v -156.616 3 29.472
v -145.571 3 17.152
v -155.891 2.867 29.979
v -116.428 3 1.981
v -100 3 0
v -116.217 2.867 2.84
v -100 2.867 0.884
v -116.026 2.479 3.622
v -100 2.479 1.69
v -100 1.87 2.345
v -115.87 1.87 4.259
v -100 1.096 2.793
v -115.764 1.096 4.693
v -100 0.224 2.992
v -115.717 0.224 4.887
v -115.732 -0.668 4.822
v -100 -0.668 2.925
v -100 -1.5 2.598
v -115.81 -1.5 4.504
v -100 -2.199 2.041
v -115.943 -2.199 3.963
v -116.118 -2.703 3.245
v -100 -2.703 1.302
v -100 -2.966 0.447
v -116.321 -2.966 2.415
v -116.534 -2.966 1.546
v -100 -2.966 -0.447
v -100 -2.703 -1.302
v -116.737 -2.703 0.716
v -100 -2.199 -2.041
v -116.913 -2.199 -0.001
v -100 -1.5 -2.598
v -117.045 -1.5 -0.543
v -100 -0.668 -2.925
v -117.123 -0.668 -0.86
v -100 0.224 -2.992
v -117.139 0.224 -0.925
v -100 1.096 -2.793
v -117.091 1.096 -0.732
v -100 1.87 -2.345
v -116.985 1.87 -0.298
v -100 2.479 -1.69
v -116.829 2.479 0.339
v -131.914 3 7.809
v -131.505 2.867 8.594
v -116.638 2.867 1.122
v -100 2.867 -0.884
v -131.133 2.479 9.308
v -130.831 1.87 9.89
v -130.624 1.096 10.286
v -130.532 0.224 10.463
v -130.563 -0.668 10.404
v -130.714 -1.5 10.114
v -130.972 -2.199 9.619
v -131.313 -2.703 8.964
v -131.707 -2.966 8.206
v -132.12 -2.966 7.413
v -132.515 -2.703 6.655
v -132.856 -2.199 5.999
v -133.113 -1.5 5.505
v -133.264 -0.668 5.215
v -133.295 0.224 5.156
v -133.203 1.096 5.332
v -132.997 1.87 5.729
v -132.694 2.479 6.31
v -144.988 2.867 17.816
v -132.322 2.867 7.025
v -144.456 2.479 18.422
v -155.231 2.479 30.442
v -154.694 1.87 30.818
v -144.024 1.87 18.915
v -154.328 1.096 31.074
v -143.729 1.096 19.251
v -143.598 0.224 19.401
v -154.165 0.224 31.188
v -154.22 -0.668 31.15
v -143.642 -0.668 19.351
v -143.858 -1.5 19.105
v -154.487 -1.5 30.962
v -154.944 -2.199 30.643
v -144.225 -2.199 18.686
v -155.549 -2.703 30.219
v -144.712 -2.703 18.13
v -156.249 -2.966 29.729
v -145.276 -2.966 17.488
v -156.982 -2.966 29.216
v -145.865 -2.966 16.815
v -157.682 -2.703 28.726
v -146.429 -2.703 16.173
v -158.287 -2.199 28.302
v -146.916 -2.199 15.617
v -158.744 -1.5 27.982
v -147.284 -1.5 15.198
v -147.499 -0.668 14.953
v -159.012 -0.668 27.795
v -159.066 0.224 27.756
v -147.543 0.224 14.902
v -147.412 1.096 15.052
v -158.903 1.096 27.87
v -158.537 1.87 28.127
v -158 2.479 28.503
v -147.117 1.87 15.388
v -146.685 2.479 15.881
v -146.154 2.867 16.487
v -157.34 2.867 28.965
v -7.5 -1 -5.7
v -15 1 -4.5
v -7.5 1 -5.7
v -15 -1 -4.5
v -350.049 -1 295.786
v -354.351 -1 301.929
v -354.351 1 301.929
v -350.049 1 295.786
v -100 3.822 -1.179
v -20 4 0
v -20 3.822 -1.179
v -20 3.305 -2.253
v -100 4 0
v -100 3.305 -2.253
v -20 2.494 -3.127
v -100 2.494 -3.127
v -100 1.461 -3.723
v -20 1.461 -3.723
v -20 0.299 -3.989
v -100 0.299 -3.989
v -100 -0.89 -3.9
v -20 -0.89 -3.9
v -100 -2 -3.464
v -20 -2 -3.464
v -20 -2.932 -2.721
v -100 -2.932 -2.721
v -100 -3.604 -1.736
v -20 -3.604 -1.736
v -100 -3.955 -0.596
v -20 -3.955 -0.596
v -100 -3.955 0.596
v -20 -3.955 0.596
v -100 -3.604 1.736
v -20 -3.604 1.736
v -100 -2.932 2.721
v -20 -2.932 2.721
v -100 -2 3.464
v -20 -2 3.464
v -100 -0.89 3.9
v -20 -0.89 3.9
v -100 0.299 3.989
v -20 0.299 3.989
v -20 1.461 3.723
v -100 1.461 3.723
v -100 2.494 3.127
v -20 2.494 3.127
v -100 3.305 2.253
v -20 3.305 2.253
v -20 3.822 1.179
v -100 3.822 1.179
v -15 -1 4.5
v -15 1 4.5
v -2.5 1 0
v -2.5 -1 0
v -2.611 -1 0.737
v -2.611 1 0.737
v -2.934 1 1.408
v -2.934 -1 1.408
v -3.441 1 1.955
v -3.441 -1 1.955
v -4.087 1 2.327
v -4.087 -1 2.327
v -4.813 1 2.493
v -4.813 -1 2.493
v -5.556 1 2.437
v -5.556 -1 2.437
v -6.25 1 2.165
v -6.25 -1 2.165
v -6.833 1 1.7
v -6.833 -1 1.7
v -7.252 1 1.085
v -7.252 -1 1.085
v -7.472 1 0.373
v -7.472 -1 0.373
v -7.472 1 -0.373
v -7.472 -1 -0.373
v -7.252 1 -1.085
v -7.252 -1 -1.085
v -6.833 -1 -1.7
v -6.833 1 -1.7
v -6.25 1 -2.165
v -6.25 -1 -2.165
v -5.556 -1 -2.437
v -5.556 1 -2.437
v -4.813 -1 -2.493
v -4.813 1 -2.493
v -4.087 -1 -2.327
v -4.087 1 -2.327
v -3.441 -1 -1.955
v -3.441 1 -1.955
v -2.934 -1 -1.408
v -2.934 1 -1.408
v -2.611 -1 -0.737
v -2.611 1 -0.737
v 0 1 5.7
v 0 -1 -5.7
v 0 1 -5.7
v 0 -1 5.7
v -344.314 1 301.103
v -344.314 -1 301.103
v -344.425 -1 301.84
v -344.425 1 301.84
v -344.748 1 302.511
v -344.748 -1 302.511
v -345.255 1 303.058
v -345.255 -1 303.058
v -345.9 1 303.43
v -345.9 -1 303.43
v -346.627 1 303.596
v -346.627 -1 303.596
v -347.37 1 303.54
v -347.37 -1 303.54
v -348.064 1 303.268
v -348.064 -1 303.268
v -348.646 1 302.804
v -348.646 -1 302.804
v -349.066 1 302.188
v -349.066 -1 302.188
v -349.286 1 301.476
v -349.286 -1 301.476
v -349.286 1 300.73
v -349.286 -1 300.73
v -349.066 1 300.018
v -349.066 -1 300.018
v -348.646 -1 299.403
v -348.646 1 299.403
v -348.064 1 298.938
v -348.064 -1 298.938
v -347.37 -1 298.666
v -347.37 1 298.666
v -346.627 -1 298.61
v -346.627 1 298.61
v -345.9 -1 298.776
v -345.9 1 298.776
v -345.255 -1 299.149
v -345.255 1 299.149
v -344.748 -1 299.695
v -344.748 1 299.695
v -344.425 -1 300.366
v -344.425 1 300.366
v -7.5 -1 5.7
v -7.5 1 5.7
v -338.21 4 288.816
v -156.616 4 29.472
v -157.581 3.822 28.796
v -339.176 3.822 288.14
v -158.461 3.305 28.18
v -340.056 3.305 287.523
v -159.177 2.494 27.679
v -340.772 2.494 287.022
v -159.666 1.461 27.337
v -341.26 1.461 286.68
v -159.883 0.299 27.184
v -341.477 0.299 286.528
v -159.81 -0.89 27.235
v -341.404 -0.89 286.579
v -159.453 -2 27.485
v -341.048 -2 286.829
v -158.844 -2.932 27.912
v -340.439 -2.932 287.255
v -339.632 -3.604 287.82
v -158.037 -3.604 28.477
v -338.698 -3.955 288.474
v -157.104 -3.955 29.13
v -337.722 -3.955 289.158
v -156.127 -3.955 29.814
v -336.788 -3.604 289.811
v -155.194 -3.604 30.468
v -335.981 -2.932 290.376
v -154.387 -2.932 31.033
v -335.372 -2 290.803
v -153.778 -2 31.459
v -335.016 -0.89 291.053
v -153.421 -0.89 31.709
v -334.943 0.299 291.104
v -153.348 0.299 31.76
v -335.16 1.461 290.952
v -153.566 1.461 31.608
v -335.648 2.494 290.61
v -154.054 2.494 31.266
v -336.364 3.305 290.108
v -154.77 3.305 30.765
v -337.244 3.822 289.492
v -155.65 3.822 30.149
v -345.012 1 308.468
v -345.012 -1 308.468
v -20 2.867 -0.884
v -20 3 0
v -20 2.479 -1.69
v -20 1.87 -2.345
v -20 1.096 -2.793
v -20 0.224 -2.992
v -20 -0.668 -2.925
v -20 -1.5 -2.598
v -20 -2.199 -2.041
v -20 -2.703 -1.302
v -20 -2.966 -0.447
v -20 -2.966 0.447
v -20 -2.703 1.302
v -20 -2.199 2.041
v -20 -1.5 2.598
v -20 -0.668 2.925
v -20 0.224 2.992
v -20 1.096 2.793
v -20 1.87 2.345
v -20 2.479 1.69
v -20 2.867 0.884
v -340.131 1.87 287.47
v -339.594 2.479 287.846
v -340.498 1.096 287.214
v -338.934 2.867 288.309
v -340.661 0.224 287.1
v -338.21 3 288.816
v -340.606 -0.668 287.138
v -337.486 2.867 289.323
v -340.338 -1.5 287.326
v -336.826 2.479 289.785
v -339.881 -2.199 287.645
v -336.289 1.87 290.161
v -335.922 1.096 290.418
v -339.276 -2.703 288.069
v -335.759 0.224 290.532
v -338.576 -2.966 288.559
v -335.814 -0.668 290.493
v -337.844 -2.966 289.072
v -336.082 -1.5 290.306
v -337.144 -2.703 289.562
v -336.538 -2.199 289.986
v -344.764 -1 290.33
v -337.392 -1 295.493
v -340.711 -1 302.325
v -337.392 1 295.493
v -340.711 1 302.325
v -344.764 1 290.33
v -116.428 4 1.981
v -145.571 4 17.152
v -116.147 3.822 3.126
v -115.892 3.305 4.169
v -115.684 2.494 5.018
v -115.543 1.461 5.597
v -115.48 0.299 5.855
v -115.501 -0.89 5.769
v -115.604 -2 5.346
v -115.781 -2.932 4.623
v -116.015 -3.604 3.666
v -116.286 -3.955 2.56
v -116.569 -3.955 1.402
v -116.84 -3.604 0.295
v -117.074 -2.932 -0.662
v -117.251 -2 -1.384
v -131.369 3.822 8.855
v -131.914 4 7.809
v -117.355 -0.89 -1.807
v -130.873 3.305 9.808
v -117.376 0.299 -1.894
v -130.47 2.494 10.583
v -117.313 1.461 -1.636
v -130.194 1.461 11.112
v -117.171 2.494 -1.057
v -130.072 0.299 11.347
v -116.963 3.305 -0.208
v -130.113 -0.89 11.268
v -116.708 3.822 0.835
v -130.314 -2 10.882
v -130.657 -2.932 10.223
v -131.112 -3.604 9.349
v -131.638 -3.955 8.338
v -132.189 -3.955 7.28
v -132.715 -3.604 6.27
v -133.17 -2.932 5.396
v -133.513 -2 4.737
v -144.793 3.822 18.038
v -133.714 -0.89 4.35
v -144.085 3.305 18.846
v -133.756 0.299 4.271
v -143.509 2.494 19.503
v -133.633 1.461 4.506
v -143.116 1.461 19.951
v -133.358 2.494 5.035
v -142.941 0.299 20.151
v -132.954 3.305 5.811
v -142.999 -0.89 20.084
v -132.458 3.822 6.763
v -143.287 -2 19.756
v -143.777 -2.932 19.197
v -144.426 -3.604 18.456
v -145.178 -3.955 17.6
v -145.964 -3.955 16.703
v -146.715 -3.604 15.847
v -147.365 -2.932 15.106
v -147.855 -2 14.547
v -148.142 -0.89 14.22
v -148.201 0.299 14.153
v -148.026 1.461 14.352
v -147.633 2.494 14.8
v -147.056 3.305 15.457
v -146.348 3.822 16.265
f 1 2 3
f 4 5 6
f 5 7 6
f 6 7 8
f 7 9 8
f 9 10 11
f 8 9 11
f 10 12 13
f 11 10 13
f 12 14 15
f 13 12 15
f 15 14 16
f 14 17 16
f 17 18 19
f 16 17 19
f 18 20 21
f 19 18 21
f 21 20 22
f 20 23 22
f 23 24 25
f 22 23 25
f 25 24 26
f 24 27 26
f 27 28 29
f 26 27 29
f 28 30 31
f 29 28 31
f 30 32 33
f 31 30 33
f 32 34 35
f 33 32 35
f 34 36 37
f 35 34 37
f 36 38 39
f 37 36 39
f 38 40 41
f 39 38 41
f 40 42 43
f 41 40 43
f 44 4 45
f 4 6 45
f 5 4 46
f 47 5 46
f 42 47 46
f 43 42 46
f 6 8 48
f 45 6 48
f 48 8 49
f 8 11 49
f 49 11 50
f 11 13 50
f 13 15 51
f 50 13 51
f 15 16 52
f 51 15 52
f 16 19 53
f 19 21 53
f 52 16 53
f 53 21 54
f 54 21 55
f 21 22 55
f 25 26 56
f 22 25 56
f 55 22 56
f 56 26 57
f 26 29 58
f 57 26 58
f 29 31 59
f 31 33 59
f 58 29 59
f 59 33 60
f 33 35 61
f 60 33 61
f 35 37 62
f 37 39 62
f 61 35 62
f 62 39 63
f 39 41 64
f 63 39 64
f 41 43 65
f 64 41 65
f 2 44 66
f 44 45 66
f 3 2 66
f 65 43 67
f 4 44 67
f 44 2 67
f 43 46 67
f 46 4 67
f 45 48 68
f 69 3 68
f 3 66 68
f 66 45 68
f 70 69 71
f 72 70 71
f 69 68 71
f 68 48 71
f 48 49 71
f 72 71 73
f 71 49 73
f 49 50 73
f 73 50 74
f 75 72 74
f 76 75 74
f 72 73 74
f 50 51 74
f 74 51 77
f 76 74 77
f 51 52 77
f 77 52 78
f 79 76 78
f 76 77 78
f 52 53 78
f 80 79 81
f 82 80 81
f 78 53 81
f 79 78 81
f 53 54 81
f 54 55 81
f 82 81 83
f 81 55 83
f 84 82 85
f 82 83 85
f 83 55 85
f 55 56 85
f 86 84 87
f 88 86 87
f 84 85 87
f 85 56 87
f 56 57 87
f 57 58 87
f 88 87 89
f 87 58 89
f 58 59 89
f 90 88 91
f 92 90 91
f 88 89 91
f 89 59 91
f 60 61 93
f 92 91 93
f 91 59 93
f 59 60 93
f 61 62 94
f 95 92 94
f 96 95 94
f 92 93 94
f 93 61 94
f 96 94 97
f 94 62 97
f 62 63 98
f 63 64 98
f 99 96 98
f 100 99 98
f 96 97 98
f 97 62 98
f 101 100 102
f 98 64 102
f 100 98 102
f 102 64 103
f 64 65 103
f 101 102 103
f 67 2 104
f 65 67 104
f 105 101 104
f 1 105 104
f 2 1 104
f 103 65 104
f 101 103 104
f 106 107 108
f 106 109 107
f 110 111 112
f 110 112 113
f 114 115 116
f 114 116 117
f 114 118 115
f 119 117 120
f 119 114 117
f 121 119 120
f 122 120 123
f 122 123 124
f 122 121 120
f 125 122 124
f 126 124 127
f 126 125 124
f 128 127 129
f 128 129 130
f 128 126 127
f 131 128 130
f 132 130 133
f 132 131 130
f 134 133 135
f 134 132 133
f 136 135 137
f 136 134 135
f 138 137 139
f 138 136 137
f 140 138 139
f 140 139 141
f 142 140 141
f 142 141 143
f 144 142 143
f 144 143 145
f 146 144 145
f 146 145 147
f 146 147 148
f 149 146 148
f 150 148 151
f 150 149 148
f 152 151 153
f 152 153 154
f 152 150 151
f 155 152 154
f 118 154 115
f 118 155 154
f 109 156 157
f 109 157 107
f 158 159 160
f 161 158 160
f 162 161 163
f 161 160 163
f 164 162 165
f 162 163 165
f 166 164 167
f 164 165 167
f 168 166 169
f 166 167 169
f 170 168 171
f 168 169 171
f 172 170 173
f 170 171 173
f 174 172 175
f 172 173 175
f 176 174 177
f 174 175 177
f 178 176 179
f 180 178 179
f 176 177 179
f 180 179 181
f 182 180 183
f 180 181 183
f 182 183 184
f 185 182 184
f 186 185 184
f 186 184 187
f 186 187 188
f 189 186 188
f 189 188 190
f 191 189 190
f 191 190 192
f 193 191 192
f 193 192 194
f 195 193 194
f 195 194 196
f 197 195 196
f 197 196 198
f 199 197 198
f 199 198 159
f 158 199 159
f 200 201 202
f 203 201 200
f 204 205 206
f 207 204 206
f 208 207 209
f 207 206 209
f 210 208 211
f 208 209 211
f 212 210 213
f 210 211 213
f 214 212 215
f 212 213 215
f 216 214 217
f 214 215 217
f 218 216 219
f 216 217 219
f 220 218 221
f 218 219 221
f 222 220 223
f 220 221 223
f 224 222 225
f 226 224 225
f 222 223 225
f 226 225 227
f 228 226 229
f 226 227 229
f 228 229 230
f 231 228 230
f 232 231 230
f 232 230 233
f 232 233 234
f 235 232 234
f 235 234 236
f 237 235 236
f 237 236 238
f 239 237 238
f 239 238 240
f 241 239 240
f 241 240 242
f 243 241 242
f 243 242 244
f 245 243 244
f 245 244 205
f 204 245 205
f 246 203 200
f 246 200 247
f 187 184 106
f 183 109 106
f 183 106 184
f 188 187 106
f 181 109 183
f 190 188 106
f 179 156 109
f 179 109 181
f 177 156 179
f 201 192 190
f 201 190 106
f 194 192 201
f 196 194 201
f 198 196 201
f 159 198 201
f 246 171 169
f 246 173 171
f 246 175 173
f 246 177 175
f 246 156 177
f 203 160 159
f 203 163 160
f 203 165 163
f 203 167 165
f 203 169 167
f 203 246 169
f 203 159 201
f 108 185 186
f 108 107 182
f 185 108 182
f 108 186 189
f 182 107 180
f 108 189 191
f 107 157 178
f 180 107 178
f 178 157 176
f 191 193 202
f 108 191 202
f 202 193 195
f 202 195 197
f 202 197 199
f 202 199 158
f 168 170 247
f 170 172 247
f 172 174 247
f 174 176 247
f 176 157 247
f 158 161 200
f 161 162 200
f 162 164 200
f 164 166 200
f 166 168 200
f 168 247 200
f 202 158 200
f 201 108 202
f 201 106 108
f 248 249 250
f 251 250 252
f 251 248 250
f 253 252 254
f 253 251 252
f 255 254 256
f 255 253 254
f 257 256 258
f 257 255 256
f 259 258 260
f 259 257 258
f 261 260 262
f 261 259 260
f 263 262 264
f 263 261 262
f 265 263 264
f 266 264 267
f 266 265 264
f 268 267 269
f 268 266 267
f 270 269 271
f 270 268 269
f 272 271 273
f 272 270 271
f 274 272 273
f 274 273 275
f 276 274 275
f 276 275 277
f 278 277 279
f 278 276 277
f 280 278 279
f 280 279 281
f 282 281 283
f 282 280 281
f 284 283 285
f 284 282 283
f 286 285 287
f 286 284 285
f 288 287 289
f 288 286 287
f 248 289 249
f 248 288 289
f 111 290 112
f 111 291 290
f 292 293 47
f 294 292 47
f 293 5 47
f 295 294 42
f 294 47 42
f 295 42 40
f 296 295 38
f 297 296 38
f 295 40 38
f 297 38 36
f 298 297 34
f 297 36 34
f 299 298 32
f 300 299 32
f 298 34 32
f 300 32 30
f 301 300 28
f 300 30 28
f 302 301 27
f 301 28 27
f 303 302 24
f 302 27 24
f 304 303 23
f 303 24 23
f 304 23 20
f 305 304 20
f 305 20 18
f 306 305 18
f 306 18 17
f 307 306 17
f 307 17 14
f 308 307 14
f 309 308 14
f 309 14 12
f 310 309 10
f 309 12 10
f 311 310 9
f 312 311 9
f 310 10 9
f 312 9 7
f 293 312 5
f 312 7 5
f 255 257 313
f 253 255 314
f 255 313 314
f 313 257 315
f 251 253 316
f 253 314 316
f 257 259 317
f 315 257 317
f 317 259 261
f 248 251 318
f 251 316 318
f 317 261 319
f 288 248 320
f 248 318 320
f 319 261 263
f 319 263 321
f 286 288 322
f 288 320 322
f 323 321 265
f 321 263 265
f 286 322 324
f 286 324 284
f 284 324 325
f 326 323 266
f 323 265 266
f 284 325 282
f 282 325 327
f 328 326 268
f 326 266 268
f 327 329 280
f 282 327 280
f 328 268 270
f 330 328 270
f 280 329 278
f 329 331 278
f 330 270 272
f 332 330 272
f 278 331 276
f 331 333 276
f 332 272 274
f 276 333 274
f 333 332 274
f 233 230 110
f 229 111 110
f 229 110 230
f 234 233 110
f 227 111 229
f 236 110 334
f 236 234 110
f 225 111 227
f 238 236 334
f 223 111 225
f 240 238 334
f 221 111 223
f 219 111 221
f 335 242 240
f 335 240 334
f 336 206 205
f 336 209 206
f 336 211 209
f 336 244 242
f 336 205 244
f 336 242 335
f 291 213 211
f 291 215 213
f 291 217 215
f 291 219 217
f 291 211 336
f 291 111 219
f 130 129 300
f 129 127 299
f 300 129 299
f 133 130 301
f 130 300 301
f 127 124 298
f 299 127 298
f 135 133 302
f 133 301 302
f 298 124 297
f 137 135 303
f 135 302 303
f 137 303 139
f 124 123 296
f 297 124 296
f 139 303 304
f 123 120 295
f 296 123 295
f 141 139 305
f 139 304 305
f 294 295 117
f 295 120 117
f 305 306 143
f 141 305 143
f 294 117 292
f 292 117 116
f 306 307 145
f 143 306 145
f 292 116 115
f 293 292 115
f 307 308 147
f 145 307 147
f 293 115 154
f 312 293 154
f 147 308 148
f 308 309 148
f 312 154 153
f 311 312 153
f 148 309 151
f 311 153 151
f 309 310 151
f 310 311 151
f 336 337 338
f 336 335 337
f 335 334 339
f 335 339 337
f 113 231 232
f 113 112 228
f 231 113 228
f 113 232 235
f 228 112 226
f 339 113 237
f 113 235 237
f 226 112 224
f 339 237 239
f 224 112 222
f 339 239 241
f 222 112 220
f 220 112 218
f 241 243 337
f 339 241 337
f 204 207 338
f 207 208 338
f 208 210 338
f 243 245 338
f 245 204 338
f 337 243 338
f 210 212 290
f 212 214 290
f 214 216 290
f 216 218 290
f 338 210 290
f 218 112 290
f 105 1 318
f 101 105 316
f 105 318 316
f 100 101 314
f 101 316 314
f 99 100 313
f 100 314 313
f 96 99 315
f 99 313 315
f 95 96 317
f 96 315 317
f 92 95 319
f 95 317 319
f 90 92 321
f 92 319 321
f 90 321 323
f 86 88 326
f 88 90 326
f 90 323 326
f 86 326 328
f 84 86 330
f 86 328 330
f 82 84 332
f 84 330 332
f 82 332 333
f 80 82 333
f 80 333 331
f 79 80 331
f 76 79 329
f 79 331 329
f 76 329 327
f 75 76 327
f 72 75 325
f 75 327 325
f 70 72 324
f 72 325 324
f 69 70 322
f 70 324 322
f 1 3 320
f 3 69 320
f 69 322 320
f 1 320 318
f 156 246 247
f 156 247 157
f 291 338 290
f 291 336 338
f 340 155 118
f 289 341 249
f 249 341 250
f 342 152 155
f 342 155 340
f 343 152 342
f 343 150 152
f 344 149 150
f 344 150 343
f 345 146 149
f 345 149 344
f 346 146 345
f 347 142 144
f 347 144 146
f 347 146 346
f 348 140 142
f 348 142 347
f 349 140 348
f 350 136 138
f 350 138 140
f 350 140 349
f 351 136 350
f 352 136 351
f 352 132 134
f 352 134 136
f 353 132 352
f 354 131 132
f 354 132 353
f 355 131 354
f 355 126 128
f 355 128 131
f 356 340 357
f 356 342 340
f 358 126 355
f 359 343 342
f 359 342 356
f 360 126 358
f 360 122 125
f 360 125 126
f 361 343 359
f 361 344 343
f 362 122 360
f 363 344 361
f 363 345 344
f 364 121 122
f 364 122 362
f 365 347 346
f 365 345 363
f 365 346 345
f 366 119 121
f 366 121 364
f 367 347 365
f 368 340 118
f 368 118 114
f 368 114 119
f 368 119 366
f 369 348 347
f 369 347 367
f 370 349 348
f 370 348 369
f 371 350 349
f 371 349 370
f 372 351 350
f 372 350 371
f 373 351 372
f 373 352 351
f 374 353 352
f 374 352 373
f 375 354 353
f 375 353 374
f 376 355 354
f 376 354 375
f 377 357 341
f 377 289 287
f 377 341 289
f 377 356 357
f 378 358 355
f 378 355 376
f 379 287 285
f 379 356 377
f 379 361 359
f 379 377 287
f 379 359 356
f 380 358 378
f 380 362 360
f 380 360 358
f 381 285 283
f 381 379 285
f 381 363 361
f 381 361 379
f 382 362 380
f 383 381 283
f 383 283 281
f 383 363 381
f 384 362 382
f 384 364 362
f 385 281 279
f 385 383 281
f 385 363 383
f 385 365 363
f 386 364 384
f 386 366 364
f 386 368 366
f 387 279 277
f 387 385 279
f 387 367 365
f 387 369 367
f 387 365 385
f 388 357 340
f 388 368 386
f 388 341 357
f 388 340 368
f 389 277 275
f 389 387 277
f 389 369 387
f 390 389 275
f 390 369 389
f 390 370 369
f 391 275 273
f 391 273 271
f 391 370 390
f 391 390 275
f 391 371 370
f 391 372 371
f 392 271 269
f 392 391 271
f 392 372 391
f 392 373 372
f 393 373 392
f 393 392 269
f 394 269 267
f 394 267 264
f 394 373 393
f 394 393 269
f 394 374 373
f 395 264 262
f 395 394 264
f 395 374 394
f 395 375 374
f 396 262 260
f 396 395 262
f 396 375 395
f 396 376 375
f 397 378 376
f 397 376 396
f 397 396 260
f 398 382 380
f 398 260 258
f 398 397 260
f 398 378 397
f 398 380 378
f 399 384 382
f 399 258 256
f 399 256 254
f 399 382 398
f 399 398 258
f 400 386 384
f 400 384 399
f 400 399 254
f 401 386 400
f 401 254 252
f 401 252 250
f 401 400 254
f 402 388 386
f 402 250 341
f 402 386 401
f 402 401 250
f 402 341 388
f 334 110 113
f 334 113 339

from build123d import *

# Parameters (mm, degrees)
F1_R      = 4
F1_R_2    = 3
F3_W      = 40
F3_H      = 27.601965531
F4_DEPTH  = 12.5
F6_DEPTH  = 1
F9_R      = 2.5
F10_DEPTH = 5.0010001


# Not quite as in the source:
# - the program builds the solid bodies; features that only make, move or delete a surface that nothing else refers to are left out


with BuildPart() as f2:
    # F2: sweep along a path in F0
    with BuildLine(Plane.XZ) as f2_path:
        Line((0, 0), (-100, 0))
        ThreePointArc((-100, 0), (-131.9137554037, 7.8092462649), (-156.615693541, 29.4722646016))
        Line((-156.615693541, 29.4722646016), (-349.6815220168, 305.1988427093))
    # F1 (on Right) → F2 (sweep)
    with BuildSketch(Plane.YZ):
        Circle(F1_R)
        Circle(F1_R_2, mode=Mode.SUBTRACT)
    sweep(path=f2_path.line)

    # F3 (on Front) → F4 (cut, symmetric)
    with BuildSketch(Plane.XZ):
        Rectangle(F3_W, F3_H)
        Polygon((-346.4049138396, 307.4931484547), (-352.958130194, 302.9045369639), (-341.4866014669, 286.5214960781), (-334.9333851126, 291.1101075689), align=None)
    extrude(amount=F4_DEPTH, both=True, mode=Mode.SUBTRACT)


with BuildPart() as f6:
    # F5 (on Front) → F6 (new body, symmetric)
    with BuildSketch(Plane.XZ):
        Polygon((0, -5.7), (0, 5.7), (-7.5, 5.7), (-15, 4.5), (-15, -4.5), (-7.5, -5.7), align=None)
    extrude(amount=F6_DEPTH, both=True)


with BuildPart() as f6b:
    # F5 (on Front) → F6, piece 2 (new body, symmetric)
    with BuildSketch(Plane.XZ):
        Polygon((-345.0123553643, 308.4682283965), (-354.3506886692, 301.9294570221), (-350.0488653966, 295.7858166899), (-344.7640596708, 290.3304680814), (-337.3916912722, 295.4926560085), (-340.7105320917, 302.3245880643), align=None)
    extrude(amount=F6_DEPTH, both=True)


with BuildPart() as f10_tool:
    # F9 (on face) → F10 (new body, through all)
    with BuildSketch(Plane.XZ.offset(1)):
        with Locations((-346.813639835, 301.1030824878)):
            Circle(F9_R)
        with Locations((-5, 0)):
            Circle(F9_R)
    extrude(amount=-F10_DEPTH)


with BuildPart() as f6_1:
    add(f6.part)

    # F10: cut by f10_tool
    add(f10_tool.part, mode=Mode.SUBTRACT)


with BuildPart() as f6b_1:
    add(f6b.part)

    # F10: cut by f10_tool
    add(f10_tool.part, mode=Mode.SUBTRACT)


solid = Compound([f2.part, f6_1.part, f6b_1.part])
